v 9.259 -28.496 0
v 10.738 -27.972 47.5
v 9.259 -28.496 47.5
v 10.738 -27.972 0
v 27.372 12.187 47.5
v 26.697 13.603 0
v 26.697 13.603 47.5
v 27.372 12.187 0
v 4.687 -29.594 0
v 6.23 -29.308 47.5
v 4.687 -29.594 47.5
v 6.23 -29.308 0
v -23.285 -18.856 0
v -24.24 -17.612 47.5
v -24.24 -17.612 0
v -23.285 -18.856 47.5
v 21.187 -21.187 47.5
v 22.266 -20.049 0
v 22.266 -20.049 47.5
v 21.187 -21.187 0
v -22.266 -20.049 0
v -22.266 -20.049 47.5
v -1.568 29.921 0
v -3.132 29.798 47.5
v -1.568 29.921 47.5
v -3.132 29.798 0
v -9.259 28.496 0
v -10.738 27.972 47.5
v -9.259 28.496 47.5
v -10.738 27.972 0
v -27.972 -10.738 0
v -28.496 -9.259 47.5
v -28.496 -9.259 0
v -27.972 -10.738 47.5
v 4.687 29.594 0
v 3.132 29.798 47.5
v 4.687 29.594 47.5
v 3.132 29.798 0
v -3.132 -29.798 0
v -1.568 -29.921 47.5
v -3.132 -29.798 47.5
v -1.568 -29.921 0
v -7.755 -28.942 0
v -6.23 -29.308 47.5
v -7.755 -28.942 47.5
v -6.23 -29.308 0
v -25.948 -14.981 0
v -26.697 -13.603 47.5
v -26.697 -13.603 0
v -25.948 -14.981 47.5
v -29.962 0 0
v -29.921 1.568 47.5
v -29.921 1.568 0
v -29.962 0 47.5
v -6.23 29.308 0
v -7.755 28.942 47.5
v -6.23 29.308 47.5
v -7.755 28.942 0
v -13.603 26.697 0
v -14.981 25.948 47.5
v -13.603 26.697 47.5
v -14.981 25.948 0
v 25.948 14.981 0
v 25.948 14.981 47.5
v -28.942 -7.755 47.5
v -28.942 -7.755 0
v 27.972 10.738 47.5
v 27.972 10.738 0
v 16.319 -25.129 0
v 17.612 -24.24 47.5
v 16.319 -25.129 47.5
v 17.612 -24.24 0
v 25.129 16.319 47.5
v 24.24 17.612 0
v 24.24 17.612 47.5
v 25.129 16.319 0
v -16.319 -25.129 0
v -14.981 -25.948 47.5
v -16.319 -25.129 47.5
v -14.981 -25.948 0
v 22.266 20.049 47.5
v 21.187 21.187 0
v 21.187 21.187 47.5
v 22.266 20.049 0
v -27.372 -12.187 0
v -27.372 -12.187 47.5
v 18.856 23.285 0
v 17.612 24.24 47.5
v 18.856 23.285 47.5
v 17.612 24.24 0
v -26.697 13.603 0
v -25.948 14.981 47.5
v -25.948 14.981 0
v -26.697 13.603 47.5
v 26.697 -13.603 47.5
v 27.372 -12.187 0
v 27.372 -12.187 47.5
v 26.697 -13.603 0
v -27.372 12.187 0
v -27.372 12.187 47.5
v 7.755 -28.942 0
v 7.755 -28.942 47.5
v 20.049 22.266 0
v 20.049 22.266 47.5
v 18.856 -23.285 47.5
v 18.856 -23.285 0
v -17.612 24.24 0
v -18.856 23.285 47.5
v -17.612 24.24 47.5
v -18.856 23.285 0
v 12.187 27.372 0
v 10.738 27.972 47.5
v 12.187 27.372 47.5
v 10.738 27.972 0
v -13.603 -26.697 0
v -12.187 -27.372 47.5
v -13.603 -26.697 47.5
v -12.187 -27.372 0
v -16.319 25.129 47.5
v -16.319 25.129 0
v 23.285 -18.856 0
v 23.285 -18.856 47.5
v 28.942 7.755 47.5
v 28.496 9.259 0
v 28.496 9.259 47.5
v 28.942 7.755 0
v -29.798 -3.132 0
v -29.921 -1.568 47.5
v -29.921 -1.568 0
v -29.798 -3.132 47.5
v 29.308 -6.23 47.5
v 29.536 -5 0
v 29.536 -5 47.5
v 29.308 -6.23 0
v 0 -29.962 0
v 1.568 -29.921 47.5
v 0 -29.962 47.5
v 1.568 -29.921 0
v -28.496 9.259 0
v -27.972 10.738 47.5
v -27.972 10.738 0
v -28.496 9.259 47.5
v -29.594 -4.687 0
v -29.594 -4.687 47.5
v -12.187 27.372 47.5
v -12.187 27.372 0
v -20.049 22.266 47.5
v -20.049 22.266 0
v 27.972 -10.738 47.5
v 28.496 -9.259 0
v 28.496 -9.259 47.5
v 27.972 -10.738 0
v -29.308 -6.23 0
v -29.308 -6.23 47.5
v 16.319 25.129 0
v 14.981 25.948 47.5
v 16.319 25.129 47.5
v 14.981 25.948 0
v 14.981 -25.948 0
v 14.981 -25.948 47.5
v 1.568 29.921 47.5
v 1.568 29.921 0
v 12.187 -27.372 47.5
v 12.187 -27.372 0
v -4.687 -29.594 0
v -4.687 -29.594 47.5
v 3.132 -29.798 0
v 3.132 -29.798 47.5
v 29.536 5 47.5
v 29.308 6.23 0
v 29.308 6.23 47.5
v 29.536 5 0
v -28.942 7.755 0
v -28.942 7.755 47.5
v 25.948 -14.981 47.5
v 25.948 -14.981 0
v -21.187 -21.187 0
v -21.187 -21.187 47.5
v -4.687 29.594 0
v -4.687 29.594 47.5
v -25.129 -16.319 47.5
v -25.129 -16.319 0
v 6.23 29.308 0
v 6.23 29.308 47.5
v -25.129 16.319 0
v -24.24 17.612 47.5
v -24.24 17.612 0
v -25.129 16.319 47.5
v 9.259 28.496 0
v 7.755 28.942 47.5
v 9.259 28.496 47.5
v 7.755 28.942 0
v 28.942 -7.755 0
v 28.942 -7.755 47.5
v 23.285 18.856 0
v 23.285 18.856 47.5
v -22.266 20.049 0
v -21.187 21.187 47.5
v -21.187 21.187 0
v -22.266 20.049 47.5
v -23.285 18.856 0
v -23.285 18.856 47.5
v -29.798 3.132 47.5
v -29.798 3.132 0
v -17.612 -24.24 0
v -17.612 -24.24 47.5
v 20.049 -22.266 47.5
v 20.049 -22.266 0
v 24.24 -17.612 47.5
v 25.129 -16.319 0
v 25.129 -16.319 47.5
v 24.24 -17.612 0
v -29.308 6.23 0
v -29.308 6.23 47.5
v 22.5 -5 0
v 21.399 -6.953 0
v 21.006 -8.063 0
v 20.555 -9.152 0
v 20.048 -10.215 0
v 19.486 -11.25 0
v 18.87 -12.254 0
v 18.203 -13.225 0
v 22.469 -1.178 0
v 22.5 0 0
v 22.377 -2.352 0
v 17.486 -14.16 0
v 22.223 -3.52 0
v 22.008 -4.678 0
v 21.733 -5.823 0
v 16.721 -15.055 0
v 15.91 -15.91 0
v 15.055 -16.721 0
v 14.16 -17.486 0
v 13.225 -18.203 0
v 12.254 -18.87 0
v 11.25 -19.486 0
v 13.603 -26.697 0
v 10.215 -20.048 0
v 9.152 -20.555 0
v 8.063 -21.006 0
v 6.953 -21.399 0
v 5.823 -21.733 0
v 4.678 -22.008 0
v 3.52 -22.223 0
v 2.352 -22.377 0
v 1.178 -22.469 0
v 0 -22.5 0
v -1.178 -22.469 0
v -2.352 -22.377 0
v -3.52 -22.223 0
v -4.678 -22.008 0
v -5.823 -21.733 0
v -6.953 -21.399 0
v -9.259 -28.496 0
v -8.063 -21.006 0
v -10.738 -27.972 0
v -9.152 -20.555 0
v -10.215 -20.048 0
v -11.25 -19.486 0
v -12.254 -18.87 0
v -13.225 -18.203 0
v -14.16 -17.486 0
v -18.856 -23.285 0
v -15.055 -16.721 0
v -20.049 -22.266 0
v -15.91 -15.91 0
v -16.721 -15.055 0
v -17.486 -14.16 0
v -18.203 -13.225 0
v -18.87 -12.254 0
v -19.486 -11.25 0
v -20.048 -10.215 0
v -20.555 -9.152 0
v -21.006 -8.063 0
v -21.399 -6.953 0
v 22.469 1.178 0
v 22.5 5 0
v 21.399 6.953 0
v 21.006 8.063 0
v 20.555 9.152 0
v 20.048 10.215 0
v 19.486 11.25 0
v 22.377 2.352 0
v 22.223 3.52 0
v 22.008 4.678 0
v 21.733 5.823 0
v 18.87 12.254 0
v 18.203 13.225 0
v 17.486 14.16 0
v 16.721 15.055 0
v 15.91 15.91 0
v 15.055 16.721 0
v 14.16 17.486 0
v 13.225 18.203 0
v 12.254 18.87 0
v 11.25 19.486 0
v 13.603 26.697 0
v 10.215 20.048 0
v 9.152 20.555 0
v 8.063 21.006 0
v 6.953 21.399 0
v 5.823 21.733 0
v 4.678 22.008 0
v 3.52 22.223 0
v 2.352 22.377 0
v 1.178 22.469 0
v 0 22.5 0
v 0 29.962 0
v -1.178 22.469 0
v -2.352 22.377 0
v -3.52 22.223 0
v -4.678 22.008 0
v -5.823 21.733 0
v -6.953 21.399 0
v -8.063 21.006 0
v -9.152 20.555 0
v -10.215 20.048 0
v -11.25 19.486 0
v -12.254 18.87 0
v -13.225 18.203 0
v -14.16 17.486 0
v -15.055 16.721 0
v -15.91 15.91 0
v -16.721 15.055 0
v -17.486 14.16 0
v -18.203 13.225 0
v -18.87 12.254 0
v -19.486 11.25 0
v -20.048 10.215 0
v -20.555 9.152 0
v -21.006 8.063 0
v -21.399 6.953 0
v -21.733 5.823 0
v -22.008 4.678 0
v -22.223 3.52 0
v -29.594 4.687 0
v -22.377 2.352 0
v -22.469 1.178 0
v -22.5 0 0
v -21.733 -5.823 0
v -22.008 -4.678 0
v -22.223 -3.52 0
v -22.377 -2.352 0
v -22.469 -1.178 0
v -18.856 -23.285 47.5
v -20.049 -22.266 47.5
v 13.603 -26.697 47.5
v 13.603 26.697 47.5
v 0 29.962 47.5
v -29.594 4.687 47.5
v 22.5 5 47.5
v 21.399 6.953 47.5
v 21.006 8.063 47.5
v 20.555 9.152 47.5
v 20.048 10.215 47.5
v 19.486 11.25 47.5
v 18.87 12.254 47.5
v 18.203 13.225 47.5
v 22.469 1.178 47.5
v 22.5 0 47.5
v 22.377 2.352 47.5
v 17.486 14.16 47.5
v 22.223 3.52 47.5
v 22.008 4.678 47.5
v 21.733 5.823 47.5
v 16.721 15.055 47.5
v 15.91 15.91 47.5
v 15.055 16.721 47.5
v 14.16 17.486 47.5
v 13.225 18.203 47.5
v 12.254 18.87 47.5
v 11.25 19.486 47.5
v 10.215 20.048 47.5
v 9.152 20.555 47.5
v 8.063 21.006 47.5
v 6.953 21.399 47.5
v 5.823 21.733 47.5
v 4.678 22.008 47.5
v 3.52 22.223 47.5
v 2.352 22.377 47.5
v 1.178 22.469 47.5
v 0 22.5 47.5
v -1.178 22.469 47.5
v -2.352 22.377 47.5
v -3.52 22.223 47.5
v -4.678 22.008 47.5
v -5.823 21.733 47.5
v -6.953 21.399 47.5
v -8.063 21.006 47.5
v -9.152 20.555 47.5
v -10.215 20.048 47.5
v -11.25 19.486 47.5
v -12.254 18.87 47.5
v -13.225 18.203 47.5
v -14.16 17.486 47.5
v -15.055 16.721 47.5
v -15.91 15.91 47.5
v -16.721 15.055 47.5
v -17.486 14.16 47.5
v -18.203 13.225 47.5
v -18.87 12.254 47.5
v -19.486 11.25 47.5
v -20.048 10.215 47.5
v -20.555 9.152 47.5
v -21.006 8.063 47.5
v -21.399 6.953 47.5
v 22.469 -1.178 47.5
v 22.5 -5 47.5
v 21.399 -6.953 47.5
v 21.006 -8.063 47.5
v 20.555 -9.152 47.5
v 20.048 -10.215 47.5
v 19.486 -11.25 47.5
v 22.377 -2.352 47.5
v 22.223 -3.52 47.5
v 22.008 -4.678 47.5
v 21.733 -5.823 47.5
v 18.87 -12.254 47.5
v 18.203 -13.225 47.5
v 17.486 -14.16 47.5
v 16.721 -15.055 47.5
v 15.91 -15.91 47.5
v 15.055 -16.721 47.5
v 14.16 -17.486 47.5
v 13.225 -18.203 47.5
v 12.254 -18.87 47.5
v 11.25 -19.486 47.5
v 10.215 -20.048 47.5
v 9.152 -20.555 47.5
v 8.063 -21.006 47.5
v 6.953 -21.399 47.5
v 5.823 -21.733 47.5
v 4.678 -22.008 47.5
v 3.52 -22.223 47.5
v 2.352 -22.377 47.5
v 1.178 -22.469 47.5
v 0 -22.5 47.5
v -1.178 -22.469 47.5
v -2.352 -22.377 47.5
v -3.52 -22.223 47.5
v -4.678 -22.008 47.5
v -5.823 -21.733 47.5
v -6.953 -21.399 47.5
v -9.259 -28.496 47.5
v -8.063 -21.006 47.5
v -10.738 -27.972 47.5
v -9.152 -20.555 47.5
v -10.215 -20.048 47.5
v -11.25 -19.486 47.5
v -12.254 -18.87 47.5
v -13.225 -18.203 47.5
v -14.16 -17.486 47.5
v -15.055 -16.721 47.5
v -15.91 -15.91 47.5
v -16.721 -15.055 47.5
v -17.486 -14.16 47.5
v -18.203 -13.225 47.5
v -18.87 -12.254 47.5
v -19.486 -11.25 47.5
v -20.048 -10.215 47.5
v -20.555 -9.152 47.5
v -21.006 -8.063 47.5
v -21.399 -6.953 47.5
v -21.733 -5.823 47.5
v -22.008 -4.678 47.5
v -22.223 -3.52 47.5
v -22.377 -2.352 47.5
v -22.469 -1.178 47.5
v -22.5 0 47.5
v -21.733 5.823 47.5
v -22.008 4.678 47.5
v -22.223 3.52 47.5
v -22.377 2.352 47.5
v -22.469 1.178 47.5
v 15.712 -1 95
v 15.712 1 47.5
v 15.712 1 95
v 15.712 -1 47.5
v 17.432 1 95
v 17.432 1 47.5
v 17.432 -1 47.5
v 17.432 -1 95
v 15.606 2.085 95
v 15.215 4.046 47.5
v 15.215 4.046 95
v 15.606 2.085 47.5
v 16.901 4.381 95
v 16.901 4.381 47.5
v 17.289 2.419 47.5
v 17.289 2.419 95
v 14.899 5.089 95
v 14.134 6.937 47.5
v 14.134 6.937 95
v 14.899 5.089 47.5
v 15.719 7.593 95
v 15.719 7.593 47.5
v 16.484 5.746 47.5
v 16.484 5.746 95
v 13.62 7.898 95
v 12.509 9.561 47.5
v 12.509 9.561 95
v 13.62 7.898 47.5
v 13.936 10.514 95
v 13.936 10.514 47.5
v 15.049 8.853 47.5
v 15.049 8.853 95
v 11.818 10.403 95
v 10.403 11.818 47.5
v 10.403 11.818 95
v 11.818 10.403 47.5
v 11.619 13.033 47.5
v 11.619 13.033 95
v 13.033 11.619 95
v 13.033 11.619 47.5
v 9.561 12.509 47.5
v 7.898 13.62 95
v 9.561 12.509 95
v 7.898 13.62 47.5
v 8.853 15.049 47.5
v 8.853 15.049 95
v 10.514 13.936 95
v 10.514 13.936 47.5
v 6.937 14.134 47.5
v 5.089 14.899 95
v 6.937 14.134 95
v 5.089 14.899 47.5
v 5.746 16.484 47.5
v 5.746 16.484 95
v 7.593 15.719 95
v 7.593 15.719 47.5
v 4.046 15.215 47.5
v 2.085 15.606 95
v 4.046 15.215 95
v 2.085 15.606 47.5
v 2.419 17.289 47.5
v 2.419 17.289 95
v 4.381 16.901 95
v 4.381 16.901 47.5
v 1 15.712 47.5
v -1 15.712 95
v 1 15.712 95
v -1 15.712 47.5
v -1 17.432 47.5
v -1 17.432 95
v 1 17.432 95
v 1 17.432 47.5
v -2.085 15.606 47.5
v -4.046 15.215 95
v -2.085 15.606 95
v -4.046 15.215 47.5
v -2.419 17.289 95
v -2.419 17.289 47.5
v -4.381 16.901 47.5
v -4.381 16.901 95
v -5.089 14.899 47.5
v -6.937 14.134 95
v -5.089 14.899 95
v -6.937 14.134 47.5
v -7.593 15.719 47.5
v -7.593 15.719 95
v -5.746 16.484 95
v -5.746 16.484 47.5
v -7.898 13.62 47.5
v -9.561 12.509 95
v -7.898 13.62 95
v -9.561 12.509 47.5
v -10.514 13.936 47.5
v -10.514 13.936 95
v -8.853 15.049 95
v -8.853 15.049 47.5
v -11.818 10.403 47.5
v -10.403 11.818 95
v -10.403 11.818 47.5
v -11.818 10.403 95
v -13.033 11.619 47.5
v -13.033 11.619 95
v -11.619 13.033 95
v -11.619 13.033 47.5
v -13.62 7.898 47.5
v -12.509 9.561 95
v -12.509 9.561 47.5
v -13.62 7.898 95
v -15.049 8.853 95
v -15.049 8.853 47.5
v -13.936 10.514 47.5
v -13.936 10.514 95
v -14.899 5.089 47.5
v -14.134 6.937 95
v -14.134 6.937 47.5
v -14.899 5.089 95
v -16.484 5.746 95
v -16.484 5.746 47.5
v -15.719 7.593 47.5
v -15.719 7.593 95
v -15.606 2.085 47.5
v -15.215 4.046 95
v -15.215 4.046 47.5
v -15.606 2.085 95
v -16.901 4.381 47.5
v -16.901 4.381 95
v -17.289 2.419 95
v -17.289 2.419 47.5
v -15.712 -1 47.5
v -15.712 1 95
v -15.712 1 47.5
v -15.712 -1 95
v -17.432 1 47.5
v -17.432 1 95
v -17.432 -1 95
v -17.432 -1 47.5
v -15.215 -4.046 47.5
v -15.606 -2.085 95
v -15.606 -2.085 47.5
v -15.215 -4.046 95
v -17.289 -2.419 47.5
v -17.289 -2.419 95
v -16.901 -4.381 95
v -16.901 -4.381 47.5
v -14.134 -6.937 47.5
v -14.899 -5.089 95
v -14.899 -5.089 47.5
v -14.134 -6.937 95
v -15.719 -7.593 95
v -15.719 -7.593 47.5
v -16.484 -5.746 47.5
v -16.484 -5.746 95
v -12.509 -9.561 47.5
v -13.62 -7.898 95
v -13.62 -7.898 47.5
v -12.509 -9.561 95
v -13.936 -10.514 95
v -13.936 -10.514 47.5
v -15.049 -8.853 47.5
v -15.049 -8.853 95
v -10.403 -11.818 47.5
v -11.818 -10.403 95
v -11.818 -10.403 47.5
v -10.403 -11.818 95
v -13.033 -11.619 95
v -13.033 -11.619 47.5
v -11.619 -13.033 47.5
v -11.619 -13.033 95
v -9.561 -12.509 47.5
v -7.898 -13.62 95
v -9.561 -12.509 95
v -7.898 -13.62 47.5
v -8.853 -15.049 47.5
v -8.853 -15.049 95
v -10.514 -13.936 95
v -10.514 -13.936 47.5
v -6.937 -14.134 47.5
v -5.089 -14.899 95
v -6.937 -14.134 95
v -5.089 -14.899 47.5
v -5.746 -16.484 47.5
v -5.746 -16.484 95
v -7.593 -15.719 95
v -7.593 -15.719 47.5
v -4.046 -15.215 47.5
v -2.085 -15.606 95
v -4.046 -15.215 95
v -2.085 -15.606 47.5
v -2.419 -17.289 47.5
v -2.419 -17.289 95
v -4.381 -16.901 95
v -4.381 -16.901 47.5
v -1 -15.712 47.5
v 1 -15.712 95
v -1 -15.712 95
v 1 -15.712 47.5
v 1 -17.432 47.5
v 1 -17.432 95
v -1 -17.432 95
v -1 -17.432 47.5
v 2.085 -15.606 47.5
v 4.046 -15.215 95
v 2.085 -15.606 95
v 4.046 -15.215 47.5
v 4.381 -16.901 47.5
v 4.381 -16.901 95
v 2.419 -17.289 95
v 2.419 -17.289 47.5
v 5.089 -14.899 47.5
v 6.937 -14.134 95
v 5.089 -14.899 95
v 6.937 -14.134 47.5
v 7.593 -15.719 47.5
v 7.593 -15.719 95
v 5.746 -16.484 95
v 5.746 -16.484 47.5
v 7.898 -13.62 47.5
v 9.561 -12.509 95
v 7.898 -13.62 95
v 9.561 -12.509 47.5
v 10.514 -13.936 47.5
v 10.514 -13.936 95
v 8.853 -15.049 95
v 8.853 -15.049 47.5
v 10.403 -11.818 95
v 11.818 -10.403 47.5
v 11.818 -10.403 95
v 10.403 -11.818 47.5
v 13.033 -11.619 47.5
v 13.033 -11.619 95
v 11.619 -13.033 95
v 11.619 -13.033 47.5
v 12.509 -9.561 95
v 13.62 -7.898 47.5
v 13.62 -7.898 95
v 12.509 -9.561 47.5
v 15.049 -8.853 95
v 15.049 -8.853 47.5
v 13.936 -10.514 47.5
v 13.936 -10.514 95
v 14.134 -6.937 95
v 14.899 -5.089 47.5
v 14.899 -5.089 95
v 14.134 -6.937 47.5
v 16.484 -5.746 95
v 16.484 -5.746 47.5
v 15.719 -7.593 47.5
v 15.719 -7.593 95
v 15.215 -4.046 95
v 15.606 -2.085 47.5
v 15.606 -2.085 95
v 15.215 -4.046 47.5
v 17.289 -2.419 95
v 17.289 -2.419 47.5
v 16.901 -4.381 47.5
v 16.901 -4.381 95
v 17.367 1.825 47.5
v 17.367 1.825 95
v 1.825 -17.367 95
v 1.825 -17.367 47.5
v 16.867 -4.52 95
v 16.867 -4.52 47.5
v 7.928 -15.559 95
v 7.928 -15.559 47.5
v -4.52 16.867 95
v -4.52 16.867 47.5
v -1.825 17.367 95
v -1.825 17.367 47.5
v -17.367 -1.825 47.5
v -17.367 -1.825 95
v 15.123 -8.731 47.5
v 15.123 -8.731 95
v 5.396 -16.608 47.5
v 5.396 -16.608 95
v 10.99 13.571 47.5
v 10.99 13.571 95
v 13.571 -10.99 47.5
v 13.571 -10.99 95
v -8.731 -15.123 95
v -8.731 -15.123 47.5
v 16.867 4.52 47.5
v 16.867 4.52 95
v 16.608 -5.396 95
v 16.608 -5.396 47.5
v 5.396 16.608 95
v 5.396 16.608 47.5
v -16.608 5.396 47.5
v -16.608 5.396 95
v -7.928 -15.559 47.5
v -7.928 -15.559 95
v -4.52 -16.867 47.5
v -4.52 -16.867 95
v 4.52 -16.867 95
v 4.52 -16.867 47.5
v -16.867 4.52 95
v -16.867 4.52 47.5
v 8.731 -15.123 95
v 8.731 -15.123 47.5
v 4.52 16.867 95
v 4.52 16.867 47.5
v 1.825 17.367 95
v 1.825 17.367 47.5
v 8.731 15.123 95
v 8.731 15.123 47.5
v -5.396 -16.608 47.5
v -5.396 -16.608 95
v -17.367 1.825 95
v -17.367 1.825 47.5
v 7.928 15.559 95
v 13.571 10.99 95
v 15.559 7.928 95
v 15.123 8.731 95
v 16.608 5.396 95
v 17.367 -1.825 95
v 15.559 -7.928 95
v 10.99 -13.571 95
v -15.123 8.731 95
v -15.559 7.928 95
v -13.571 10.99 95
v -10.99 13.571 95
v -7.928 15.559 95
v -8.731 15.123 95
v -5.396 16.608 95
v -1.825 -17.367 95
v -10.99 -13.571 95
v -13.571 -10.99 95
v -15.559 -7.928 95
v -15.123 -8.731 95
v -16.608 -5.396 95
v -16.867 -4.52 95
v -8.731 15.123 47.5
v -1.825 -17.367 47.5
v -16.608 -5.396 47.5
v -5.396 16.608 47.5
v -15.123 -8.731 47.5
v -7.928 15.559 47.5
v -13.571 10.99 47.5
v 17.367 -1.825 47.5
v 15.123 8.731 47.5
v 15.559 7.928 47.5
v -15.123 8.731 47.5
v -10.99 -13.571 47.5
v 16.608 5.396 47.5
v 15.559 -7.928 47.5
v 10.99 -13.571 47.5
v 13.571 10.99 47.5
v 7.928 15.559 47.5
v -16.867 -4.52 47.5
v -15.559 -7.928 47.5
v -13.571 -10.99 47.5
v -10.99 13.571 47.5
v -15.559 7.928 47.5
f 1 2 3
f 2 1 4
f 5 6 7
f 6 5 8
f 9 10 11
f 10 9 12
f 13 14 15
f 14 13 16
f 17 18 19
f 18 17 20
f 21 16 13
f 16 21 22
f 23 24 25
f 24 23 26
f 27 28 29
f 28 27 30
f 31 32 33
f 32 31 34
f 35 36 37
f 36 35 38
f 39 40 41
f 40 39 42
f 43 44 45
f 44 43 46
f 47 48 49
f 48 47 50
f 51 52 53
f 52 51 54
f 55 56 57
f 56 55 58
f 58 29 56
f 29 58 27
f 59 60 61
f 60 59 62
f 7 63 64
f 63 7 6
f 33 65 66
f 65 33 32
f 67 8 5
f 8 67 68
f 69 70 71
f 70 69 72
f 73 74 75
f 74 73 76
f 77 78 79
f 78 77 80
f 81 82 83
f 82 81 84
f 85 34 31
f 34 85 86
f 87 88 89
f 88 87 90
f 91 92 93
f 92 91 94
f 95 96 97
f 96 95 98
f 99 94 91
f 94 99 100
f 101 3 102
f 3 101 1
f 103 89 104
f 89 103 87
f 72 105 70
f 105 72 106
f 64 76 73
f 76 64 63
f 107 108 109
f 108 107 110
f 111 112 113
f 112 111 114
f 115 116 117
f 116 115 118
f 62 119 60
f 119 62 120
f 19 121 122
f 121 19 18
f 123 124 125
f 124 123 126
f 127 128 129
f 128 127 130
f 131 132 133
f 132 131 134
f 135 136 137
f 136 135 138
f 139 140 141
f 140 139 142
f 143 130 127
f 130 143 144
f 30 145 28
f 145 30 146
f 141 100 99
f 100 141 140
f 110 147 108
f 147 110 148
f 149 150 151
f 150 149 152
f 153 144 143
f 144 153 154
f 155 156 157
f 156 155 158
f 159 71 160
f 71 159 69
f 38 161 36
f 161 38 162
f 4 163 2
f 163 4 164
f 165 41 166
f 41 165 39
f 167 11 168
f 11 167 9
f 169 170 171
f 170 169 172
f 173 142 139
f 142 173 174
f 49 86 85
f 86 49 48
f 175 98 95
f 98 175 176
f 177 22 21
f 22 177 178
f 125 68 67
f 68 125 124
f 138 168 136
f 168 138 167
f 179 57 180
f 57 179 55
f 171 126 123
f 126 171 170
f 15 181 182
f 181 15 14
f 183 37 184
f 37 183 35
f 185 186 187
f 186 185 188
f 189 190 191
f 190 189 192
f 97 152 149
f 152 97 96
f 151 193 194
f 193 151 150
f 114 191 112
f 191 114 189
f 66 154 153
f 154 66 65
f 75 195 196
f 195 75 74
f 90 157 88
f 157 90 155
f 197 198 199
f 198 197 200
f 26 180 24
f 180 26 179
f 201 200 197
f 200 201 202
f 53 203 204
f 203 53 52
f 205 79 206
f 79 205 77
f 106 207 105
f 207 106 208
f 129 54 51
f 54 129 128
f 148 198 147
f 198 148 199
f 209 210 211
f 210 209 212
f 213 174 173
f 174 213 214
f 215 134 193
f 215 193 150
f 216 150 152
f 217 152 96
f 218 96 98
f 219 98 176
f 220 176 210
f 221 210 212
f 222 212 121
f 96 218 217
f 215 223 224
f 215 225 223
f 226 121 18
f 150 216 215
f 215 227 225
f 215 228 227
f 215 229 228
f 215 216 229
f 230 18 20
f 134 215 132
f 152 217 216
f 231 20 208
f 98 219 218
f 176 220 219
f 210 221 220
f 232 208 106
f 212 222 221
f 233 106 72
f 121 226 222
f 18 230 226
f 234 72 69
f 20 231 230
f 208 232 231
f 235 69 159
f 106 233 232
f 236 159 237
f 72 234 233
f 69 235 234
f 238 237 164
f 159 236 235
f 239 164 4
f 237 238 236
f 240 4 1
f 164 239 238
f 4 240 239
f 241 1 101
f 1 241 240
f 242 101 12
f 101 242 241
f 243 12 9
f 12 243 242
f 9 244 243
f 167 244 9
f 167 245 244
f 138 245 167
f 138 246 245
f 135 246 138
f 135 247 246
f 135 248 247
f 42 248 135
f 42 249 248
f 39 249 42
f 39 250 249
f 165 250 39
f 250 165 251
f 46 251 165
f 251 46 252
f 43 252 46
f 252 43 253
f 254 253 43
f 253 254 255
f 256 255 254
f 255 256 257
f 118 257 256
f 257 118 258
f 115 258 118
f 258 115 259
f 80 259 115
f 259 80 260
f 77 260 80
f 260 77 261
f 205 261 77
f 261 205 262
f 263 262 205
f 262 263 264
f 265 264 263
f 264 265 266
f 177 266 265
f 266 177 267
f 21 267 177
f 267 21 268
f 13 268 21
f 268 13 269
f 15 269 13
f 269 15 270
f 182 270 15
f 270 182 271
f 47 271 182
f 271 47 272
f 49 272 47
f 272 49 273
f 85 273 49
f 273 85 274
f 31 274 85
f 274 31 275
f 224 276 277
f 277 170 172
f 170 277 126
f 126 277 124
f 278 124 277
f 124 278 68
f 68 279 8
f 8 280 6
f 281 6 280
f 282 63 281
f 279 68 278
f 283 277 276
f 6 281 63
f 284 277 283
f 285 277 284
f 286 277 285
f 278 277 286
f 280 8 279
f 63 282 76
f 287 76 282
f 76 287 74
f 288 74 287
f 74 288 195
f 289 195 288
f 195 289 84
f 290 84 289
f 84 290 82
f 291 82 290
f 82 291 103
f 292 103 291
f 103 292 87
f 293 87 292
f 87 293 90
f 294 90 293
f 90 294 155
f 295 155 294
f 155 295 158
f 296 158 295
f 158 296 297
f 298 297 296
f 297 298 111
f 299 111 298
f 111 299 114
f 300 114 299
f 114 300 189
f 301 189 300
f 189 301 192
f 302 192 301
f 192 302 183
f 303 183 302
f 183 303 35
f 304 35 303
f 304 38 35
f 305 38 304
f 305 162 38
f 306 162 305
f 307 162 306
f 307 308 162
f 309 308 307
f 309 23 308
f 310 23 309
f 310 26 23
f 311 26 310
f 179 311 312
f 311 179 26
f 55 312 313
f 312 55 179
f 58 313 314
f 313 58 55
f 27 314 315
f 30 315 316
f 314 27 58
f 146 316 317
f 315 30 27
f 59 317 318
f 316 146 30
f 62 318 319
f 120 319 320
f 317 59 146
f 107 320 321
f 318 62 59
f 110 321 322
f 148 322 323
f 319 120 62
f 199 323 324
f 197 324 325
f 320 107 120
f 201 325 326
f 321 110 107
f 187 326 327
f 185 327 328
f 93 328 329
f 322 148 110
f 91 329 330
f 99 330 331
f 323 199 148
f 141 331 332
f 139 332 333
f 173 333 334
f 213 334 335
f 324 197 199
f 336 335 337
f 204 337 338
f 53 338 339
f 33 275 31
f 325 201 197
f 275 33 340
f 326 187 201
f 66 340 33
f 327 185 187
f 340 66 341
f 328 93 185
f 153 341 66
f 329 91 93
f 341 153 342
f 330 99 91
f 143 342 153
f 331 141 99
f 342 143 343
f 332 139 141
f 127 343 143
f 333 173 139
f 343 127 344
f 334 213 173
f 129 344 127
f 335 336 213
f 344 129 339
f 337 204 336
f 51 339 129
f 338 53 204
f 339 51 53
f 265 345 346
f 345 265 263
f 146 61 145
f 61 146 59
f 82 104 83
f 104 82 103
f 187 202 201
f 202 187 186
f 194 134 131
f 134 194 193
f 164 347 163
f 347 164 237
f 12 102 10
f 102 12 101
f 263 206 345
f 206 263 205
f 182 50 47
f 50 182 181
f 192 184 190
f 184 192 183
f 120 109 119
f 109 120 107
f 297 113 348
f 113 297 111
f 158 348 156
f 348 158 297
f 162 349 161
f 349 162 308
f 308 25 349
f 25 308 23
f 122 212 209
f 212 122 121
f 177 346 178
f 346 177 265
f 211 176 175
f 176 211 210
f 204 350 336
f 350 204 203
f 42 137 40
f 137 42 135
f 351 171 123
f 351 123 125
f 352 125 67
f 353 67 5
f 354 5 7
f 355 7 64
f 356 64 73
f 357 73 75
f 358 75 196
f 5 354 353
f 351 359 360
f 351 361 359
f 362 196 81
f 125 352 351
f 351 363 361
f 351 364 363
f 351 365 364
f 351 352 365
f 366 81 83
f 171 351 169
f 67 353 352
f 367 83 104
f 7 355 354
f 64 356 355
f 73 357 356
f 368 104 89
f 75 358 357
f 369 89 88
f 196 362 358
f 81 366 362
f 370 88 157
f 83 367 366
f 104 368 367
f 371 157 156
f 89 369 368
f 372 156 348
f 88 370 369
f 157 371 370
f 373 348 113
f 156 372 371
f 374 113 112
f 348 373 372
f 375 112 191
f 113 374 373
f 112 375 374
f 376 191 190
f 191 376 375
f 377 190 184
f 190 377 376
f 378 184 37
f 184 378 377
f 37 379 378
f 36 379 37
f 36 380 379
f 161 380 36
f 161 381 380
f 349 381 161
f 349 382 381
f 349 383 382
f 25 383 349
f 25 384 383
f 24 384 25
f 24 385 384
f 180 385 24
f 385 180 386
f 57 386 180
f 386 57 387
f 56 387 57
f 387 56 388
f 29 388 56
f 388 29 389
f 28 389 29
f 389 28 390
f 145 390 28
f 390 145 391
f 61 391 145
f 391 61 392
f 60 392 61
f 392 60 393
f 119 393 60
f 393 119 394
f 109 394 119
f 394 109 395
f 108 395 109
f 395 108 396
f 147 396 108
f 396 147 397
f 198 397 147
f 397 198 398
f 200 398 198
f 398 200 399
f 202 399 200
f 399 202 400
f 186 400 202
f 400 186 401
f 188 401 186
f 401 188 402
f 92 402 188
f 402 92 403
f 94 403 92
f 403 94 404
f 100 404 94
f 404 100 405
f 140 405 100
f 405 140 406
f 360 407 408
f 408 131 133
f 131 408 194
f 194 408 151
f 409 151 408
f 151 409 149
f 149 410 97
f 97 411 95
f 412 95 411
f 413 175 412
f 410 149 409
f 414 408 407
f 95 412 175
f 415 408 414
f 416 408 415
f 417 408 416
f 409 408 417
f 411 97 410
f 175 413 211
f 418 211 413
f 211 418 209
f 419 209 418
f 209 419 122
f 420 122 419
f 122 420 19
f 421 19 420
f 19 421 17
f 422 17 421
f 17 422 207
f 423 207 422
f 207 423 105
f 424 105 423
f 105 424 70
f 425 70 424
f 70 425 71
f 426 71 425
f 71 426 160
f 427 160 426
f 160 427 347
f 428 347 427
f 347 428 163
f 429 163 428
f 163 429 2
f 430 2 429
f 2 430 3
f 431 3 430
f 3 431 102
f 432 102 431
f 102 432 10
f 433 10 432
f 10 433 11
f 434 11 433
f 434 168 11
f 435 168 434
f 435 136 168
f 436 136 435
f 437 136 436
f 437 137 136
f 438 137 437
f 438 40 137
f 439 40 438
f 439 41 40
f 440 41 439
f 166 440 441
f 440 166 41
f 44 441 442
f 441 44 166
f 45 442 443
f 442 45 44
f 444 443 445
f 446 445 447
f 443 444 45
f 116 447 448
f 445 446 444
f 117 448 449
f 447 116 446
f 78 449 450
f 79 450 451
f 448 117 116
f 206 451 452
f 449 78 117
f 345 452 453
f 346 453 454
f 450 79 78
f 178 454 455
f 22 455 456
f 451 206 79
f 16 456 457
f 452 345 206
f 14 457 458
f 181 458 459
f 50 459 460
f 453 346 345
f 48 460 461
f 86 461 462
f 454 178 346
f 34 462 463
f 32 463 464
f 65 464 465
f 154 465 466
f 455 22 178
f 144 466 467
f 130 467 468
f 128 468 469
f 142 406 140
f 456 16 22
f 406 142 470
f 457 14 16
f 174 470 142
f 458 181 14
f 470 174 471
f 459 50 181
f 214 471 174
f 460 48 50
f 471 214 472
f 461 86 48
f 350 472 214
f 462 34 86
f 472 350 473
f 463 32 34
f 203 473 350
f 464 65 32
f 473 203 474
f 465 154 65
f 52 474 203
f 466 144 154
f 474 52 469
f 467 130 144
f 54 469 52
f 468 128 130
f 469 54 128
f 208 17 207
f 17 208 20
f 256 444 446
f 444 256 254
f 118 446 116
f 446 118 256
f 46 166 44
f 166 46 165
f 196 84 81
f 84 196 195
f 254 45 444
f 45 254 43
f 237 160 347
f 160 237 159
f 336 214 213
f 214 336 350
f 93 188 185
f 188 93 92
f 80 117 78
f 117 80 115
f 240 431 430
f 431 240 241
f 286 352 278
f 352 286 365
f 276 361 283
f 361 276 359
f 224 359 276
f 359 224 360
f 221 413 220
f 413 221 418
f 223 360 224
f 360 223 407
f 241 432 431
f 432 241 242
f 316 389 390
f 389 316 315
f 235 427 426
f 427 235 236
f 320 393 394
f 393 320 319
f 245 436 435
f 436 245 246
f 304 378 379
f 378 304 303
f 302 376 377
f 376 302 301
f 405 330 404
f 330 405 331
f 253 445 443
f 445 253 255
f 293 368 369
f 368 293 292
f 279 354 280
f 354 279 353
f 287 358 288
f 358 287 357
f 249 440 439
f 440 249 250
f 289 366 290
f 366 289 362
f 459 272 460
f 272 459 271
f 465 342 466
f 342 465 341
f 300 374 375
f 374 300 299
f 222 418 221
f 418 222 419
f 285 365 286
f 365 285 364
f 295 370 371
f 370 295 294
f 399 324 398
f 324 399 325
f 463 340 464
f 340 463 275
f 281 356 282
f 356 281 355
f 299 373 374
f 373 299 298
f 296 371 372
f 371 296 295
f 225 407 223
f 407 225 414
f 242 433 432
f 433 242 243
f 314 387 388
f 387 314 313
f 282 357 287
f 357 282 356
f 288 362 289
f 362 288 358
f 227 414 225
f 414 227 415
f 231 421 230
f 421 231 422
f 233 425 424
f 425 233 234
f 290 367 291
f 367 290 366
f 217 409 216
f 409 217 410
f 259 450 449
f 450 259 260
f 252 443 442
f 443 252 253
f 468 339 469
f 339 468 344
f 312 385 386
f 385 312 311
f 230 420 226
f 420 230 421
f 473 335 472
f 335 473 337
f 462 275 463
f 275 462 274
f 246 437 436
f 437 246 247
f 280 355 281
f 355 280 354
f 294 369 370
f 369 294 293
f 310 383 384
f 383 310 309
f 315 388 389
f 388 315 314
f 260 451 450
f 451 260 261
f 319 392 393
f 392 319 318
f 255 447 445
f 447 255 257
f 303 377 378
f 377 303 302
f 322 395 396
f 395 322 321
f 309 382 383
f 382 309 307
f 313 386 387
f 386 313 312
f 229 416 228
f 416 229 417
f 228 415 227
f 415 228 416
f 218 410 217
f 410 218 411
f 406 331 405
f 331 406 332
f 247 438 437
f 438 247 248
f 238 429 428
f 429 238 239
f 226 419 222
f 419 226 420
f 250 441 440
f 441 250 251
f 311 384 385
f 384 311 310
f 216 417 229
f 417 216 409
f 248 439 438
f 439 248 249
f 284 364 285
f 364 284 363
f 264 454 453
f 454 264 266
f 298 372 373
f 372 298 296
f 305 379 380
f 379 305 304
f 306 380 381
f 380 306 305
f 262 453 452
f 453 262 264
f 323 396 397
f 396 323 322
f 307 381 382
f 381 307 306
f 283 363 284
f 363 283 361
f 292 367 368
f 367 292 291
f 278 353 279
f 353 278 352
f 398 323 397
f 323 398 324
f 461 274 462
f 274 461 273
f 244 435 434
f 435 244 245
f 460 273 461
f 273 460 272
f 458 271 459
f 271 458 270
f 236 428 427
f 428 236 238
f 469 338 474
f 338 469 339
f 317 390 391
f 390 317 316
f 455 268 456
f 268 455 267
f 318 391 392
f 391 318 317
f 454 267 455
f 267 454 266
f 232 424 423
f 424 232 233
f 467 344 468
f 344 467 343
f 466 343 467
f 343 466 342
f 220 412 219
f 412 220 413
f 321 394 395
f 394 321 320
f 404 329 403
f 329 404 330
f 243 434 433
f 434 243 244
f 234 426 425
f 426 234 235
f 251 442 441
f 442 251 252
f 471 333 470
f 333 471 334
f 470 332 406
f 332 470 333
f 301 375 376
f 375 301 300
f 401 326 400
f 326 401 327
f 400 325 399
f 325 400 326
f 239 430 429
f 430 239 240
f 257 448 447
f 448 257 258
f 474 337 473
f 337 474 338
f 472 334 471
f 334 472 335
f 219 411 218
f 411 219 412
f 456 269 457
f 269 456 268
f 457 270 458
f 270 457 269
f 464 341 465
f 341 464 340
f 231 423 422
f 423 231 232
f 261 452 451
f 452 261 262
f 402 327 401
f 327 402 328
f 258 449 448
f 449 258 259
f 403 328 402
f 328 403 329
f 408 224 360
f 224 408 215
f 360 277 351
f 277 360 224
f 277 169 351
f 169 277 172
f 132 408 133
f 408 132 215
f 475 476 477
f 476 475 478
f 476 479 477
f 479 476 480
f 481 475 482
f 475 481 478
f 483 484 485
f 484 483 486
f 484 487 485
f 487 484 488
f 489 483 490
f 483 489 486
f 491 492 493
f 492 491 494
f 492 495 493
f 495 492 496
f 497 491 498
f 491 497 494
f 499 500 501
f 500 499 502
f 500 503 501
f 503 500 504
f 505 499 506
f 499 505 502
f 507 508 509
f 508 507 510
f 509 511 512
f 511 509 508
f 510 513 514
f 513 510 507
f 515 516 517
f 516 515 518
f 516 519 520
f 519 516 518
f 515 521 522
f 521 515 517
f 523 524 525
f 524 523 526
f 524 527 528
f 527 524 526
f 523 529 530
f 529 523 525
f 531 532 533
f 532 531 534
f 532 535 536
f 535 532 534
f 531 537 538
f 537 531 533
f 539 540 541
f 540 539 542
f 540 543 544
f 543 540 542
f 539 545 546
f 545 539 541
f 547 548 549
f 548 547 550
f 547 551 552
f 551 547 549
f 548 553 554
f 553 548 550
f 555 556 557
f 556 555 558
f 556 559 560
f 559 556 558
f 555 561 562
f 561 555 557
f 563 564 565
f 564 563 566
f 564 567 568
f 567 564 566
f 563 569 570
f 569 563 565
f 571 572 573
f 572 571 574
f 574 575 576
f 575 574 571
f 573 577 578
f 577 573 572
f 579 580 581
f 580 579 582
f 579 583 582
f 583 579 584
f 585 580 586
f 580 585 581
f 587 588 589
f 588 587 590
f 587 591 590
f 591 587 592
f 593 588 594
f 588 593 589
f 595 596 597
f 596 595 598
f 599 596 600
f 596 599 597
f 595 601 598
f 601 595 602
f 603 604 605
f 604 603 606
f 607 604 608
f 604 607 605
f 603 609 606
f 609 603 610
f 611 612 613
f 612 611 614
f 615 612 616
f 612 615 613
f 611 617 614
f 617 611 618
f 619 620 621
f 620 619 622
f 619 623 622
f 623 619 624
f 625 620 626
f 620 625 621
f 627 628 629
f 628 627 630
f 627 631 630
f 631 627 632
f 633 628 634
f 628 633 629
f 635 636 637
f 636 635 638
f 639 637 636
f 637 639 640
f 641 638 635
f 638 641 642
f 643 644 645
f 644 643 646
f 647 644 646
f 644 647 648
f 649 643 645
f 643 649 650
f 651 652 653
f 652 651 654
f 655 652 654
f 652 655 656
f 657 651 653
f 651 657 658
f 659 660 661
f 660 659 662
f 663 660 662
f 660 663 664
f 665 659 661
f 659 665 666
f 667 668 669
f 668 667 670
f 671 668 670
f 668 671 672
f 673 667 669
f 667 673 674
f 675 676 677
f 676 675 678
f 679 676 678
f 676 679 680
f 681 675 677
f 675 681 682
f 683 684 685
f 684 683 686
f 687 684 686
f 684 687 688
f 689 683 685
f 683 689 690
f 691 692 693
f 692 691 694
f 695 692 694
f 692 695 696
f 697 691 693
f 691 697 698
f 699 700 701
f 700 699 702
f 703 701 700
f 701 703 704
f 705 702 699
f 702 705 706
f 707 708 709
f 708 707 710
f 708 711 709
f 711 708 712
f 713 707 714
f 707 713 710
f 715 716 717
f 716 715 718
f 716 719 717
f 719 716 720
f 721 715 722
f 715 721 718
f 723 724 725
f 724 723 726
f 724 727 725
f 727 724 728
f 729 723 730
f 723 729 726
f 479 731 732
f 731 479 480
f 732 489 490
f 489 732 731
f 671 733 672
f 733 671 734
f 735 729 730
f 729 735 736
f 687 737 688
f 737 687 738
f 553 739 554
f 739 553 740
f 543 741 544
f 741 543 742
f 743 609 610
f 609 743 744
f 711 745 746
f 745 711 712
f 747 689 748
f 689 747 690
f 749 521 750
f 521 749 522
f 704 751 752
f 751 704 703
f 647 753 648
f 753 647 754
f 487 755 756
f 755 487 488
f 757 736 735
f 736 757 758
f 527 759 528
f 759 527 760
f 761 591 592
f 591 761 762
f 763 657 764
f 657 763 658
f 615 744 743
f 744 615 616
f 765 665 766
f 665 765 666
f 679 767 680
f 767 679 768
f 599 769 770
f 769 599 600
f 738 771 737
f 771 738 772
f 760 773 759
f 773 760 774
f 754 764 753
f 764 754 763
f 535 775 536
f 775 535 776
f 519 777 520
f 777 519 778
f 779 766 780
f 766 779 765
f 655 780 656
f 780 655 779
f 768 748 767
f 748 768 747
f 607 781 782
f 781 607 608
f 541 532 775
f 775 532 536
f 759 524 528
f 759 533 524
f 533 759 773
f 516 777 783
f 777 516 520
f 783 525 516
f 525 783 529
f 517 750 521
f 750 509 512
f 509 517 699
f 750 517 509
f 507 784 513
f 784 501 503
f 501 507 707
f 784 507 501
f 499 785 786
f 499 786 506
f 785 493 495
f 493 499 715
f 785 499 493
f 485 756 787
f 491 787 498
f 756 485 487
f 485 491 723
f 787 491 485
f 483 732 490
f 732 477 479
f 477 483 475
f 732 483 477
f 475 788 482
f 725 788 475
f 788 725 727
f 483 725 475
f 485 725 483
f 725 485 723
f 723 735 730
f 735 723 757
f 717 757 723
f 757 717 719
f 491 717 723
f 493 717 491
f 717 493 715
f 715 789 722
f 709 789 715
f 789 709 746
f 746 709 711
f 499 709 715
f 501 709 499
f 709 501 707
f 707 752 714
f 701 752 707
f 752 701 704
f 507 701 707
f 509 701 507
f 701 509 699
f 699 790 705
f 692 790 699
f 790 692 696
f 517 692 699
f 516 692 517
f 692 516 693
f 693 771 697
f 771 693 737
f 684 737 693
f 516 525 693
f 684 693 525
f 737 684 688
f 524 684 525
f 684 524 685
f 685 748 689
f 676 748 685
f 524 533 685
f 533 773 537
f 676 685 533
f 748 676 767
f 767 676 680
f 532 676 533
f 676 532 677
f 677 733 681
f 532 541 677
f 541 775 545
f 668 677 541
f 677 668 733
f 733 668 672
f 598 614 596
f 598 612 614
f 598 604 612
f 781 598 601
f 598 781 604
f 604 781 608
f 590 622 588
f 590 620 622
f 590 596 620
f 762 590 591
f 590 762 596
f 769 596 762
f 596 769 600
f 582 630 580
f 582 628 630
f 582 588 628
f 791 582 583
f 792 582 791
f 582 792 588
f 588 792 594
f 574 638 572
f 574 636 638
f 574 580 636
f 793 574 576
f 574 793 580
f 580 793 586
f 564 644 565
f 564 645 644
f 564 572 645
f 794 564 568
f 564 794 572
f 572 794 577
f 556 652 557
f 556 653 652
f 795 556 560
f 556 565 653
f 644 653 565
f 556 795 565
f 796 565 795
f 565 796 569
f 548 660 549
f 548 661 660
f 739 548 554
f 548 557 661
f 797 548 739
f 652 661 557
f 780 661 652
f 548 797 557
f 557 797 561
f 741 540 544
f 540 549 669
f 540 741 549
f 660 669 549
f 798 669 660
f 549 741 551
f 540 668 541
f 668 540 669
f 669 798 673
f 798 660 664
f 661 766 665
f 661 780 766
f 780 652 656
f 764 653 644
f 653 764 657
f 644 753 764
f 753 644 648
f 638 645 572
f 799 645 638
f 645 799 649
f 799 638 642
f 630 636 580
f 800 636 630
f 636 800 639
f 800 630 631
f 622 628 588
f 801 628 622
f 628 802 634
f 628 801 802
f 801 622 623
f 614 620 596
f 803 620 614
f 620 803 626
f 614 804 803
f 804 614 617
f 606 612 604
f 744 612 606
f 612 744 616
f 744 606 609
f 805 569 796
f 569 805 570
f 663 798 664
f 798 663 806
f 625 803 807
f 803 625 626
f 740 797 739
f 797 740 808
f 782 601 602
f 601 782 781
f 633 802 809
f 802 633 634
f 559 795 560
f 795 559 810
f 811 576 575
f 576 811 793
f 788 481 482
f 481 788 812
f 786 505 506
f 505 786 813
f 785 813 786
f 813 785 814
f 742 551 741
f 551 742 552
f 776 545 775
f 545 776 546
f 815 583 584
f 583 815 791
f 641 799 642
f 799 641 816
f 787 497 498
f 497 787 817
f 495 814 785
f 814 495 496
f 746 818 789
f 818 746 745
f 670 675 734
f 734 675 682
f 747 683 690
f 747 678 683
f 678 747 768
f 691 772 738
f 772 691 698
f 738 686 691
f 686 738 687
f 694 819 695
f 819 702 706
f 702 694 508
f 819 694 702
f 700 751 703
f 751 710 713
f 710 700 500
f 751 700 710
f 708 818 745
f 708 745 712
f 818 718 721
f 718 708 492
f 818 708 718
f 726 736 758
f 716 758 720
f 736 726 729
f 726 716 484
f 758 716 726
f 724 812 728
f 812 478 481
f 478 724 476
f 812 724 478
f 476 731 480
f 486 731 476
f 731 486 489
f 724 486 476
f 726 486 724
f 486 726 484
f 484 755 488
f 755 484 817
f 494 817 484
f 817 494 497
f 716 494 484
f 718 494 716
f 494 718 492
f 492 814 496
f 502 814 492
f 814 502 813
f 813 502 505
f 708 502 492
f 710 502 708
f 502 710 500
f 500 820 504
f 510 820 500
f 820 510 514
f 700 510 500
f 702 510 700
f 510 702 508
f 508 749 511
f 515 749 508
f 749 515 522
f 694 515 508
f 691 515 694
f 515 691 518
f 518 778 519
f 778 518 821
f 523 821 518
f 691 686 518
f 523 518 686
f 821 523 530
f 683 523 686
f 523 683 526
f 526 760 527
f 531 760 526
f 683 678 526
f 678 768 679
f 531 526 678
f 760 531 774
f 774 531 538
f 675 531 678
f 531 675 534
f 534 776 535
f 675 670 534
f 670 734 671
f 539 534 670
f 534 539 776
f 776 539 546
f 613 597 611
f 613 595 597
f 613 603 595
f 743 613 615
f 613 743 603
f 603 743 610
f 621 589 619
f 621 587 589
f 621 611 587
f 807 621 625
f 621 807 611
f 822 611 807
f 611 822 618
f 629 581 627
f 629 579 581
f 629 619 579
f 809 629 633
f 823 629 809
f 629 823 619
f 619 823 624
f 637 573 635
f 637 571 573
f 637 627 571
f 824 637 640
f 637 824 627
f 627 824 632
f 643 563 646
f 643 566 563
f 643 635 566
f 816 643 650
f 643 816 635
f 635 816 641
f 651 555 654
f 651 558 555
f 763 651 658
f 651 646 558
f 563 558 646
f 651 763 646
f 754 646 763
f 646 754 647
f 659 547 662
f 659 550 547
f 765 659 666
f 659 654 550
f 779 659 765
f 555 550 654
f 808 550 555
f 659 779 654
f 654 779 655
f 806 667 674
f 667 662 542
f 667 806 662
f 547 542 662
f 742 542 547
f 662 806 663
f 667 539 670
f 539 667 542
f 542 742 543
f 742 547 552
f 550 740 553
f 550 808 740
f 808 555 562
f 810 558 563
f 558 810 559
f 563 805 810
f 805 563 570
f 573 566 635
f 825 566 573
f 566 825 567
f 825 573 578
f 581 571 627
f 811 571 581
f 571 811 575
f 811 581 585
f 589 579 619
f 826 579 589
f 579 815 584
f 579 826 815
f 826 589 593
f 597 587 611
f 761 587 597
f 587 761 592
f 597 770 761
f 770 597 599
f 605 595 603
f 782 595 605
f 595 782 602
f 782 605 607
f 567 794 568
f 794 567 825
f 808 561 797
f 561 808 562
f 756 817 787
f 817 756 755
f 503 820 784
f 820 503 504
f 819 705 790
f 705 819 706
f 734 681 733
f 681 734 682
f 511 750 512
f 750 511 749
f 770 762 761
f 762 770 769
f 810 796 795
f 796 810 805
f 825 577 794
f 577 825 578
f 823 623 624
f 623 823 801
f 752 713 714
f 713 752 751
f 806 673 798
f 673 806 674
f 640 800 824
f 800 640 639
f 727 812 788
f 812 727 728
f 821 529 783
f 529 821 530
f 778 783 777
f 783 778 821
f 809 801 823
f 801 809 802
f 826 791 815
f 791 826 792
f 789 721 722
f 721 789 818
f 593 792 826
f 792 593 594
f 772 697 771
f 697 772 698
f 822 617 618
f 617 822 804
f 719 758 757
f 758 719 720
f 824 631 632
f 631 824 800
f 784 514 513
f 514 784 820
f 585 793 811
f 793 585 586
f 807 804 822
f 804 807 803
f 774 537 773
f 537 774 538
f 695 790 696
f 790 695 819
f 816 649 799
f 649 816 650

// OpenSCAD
// ====================================================================================
// REVOLUTIONARY TECHNOLOGY COMPANY & UNIVERSITY OF WASHINGTON DEPARTMENT OF PHYSICS
// Subsystem: copo_transmission_coupler.scad (Parametric Direct-Drive Transmission Hub)
// Core Objective: Adapts Square-Tooth Motor Axis to Manual Clutch or Automatic Gearbox
// Center Origin (0,0,0) = Concentric Centerline Axis of the Drivetrain Shaft Splines
// ====================================================================================

$fn = 120; // High-precision CNC spline-cutting profiling resolution

// --- Master Transmission Configuration Selector ---
// 1 = 6-Speed Manual (Tremec TR-6060 26-Spline Clutch Profile)
// 2 = 10-Speed Automatic (GM 10L90 Heavy-Duty Direct-Drive Spline Yoke)
TRANSMISSION_TYPE_SELECT = 2;

// --- Physical Dimensional Constants (mm) ---
inch_to_mm          = 25.4;
motor_shaft_input_d = 45.00;           // Standard solid motor drive output axle
coupler_total_len   = 95.00;           // Mechanical engagement depth profile

// Parametric Spline Configuration Math Lookups
spline_major_dia = (TRANSMISSION_TYPE_SELECT == 1) ? 1.125 * inch_to_mm : 1.375 * inch_to_mm; // 28.575mm vs 34.925mm
num_spline_teeth = (TRANSMISSION_TYPE_SELECT == 1) ? 26 : 32;                                 // 26-spline manual vs 32-spline auto yoke
variant_string   = (TRANSMISSION_TYPE_SELECT == 1) ? "TR6060_MANUAL_26_SPLINE_CLUTCH_HUB" : "10L90_AUTOMATIC_32_SPLINE_DIRECT_YOKE";

module motor_side_engagement_socket() {
    echo(str("COMPILING CAD TRANSMISSION COUPLER BLUEPRINT: ", variant_string));
    color("Silver") {
        difference() {
            // Main solid steel coupling collar sleeve barrel
            cylinder(d=spline_major_dia + 25, h=coupler_total_len/2, center=false);
            // Reamed precision bore to slip tightly onto the axial-flux motor shaft
            translate([0, 0, -1])
                cylinder(d=motor_shaft_input_d, h=coupler_total_len/2 + 2);
            // Deep keyway slot to lock motor rotation using a structural steel key
            translate([motor_shaft_input_d/2, -5, -1])
                cube([10, 10, coupler_total_len/2 + 2]);
        }
    }
}

module transmission_side_spline_shaft() {
    // Generates the parametric involute spine teeth to slide straight into the transmission assembly
    color("LightGrey") {
        translate([0, 0, coupler_total_len/2]) {
            difference() {
                // Outer spline core blank shaft
                cylinder(d=spline_major_dia, h=coupler_total_len/2, center=false);
                
                // Parametric Spline Tooth Generation Passages
                for (s = [0 : num_spline_teeth - 1]) {
                    rotate([0, 0, s * (360 / num_spline_teeth)])
                        translate([spline_major_dia/2, 0, coupler_total_len/4])
                            // Cuts an exact negative groove profile into the shaft face boundary walls
                            cube([3.5, 2.0, coupler_total_len/2 + 2], center=true);
                }
            }
        }
    }
}

// --- Composite Mechanical Coupler Instantiation ---
union() {
    motor_side_engagement_socket();
    transmission_side_spline_shaft();
}
